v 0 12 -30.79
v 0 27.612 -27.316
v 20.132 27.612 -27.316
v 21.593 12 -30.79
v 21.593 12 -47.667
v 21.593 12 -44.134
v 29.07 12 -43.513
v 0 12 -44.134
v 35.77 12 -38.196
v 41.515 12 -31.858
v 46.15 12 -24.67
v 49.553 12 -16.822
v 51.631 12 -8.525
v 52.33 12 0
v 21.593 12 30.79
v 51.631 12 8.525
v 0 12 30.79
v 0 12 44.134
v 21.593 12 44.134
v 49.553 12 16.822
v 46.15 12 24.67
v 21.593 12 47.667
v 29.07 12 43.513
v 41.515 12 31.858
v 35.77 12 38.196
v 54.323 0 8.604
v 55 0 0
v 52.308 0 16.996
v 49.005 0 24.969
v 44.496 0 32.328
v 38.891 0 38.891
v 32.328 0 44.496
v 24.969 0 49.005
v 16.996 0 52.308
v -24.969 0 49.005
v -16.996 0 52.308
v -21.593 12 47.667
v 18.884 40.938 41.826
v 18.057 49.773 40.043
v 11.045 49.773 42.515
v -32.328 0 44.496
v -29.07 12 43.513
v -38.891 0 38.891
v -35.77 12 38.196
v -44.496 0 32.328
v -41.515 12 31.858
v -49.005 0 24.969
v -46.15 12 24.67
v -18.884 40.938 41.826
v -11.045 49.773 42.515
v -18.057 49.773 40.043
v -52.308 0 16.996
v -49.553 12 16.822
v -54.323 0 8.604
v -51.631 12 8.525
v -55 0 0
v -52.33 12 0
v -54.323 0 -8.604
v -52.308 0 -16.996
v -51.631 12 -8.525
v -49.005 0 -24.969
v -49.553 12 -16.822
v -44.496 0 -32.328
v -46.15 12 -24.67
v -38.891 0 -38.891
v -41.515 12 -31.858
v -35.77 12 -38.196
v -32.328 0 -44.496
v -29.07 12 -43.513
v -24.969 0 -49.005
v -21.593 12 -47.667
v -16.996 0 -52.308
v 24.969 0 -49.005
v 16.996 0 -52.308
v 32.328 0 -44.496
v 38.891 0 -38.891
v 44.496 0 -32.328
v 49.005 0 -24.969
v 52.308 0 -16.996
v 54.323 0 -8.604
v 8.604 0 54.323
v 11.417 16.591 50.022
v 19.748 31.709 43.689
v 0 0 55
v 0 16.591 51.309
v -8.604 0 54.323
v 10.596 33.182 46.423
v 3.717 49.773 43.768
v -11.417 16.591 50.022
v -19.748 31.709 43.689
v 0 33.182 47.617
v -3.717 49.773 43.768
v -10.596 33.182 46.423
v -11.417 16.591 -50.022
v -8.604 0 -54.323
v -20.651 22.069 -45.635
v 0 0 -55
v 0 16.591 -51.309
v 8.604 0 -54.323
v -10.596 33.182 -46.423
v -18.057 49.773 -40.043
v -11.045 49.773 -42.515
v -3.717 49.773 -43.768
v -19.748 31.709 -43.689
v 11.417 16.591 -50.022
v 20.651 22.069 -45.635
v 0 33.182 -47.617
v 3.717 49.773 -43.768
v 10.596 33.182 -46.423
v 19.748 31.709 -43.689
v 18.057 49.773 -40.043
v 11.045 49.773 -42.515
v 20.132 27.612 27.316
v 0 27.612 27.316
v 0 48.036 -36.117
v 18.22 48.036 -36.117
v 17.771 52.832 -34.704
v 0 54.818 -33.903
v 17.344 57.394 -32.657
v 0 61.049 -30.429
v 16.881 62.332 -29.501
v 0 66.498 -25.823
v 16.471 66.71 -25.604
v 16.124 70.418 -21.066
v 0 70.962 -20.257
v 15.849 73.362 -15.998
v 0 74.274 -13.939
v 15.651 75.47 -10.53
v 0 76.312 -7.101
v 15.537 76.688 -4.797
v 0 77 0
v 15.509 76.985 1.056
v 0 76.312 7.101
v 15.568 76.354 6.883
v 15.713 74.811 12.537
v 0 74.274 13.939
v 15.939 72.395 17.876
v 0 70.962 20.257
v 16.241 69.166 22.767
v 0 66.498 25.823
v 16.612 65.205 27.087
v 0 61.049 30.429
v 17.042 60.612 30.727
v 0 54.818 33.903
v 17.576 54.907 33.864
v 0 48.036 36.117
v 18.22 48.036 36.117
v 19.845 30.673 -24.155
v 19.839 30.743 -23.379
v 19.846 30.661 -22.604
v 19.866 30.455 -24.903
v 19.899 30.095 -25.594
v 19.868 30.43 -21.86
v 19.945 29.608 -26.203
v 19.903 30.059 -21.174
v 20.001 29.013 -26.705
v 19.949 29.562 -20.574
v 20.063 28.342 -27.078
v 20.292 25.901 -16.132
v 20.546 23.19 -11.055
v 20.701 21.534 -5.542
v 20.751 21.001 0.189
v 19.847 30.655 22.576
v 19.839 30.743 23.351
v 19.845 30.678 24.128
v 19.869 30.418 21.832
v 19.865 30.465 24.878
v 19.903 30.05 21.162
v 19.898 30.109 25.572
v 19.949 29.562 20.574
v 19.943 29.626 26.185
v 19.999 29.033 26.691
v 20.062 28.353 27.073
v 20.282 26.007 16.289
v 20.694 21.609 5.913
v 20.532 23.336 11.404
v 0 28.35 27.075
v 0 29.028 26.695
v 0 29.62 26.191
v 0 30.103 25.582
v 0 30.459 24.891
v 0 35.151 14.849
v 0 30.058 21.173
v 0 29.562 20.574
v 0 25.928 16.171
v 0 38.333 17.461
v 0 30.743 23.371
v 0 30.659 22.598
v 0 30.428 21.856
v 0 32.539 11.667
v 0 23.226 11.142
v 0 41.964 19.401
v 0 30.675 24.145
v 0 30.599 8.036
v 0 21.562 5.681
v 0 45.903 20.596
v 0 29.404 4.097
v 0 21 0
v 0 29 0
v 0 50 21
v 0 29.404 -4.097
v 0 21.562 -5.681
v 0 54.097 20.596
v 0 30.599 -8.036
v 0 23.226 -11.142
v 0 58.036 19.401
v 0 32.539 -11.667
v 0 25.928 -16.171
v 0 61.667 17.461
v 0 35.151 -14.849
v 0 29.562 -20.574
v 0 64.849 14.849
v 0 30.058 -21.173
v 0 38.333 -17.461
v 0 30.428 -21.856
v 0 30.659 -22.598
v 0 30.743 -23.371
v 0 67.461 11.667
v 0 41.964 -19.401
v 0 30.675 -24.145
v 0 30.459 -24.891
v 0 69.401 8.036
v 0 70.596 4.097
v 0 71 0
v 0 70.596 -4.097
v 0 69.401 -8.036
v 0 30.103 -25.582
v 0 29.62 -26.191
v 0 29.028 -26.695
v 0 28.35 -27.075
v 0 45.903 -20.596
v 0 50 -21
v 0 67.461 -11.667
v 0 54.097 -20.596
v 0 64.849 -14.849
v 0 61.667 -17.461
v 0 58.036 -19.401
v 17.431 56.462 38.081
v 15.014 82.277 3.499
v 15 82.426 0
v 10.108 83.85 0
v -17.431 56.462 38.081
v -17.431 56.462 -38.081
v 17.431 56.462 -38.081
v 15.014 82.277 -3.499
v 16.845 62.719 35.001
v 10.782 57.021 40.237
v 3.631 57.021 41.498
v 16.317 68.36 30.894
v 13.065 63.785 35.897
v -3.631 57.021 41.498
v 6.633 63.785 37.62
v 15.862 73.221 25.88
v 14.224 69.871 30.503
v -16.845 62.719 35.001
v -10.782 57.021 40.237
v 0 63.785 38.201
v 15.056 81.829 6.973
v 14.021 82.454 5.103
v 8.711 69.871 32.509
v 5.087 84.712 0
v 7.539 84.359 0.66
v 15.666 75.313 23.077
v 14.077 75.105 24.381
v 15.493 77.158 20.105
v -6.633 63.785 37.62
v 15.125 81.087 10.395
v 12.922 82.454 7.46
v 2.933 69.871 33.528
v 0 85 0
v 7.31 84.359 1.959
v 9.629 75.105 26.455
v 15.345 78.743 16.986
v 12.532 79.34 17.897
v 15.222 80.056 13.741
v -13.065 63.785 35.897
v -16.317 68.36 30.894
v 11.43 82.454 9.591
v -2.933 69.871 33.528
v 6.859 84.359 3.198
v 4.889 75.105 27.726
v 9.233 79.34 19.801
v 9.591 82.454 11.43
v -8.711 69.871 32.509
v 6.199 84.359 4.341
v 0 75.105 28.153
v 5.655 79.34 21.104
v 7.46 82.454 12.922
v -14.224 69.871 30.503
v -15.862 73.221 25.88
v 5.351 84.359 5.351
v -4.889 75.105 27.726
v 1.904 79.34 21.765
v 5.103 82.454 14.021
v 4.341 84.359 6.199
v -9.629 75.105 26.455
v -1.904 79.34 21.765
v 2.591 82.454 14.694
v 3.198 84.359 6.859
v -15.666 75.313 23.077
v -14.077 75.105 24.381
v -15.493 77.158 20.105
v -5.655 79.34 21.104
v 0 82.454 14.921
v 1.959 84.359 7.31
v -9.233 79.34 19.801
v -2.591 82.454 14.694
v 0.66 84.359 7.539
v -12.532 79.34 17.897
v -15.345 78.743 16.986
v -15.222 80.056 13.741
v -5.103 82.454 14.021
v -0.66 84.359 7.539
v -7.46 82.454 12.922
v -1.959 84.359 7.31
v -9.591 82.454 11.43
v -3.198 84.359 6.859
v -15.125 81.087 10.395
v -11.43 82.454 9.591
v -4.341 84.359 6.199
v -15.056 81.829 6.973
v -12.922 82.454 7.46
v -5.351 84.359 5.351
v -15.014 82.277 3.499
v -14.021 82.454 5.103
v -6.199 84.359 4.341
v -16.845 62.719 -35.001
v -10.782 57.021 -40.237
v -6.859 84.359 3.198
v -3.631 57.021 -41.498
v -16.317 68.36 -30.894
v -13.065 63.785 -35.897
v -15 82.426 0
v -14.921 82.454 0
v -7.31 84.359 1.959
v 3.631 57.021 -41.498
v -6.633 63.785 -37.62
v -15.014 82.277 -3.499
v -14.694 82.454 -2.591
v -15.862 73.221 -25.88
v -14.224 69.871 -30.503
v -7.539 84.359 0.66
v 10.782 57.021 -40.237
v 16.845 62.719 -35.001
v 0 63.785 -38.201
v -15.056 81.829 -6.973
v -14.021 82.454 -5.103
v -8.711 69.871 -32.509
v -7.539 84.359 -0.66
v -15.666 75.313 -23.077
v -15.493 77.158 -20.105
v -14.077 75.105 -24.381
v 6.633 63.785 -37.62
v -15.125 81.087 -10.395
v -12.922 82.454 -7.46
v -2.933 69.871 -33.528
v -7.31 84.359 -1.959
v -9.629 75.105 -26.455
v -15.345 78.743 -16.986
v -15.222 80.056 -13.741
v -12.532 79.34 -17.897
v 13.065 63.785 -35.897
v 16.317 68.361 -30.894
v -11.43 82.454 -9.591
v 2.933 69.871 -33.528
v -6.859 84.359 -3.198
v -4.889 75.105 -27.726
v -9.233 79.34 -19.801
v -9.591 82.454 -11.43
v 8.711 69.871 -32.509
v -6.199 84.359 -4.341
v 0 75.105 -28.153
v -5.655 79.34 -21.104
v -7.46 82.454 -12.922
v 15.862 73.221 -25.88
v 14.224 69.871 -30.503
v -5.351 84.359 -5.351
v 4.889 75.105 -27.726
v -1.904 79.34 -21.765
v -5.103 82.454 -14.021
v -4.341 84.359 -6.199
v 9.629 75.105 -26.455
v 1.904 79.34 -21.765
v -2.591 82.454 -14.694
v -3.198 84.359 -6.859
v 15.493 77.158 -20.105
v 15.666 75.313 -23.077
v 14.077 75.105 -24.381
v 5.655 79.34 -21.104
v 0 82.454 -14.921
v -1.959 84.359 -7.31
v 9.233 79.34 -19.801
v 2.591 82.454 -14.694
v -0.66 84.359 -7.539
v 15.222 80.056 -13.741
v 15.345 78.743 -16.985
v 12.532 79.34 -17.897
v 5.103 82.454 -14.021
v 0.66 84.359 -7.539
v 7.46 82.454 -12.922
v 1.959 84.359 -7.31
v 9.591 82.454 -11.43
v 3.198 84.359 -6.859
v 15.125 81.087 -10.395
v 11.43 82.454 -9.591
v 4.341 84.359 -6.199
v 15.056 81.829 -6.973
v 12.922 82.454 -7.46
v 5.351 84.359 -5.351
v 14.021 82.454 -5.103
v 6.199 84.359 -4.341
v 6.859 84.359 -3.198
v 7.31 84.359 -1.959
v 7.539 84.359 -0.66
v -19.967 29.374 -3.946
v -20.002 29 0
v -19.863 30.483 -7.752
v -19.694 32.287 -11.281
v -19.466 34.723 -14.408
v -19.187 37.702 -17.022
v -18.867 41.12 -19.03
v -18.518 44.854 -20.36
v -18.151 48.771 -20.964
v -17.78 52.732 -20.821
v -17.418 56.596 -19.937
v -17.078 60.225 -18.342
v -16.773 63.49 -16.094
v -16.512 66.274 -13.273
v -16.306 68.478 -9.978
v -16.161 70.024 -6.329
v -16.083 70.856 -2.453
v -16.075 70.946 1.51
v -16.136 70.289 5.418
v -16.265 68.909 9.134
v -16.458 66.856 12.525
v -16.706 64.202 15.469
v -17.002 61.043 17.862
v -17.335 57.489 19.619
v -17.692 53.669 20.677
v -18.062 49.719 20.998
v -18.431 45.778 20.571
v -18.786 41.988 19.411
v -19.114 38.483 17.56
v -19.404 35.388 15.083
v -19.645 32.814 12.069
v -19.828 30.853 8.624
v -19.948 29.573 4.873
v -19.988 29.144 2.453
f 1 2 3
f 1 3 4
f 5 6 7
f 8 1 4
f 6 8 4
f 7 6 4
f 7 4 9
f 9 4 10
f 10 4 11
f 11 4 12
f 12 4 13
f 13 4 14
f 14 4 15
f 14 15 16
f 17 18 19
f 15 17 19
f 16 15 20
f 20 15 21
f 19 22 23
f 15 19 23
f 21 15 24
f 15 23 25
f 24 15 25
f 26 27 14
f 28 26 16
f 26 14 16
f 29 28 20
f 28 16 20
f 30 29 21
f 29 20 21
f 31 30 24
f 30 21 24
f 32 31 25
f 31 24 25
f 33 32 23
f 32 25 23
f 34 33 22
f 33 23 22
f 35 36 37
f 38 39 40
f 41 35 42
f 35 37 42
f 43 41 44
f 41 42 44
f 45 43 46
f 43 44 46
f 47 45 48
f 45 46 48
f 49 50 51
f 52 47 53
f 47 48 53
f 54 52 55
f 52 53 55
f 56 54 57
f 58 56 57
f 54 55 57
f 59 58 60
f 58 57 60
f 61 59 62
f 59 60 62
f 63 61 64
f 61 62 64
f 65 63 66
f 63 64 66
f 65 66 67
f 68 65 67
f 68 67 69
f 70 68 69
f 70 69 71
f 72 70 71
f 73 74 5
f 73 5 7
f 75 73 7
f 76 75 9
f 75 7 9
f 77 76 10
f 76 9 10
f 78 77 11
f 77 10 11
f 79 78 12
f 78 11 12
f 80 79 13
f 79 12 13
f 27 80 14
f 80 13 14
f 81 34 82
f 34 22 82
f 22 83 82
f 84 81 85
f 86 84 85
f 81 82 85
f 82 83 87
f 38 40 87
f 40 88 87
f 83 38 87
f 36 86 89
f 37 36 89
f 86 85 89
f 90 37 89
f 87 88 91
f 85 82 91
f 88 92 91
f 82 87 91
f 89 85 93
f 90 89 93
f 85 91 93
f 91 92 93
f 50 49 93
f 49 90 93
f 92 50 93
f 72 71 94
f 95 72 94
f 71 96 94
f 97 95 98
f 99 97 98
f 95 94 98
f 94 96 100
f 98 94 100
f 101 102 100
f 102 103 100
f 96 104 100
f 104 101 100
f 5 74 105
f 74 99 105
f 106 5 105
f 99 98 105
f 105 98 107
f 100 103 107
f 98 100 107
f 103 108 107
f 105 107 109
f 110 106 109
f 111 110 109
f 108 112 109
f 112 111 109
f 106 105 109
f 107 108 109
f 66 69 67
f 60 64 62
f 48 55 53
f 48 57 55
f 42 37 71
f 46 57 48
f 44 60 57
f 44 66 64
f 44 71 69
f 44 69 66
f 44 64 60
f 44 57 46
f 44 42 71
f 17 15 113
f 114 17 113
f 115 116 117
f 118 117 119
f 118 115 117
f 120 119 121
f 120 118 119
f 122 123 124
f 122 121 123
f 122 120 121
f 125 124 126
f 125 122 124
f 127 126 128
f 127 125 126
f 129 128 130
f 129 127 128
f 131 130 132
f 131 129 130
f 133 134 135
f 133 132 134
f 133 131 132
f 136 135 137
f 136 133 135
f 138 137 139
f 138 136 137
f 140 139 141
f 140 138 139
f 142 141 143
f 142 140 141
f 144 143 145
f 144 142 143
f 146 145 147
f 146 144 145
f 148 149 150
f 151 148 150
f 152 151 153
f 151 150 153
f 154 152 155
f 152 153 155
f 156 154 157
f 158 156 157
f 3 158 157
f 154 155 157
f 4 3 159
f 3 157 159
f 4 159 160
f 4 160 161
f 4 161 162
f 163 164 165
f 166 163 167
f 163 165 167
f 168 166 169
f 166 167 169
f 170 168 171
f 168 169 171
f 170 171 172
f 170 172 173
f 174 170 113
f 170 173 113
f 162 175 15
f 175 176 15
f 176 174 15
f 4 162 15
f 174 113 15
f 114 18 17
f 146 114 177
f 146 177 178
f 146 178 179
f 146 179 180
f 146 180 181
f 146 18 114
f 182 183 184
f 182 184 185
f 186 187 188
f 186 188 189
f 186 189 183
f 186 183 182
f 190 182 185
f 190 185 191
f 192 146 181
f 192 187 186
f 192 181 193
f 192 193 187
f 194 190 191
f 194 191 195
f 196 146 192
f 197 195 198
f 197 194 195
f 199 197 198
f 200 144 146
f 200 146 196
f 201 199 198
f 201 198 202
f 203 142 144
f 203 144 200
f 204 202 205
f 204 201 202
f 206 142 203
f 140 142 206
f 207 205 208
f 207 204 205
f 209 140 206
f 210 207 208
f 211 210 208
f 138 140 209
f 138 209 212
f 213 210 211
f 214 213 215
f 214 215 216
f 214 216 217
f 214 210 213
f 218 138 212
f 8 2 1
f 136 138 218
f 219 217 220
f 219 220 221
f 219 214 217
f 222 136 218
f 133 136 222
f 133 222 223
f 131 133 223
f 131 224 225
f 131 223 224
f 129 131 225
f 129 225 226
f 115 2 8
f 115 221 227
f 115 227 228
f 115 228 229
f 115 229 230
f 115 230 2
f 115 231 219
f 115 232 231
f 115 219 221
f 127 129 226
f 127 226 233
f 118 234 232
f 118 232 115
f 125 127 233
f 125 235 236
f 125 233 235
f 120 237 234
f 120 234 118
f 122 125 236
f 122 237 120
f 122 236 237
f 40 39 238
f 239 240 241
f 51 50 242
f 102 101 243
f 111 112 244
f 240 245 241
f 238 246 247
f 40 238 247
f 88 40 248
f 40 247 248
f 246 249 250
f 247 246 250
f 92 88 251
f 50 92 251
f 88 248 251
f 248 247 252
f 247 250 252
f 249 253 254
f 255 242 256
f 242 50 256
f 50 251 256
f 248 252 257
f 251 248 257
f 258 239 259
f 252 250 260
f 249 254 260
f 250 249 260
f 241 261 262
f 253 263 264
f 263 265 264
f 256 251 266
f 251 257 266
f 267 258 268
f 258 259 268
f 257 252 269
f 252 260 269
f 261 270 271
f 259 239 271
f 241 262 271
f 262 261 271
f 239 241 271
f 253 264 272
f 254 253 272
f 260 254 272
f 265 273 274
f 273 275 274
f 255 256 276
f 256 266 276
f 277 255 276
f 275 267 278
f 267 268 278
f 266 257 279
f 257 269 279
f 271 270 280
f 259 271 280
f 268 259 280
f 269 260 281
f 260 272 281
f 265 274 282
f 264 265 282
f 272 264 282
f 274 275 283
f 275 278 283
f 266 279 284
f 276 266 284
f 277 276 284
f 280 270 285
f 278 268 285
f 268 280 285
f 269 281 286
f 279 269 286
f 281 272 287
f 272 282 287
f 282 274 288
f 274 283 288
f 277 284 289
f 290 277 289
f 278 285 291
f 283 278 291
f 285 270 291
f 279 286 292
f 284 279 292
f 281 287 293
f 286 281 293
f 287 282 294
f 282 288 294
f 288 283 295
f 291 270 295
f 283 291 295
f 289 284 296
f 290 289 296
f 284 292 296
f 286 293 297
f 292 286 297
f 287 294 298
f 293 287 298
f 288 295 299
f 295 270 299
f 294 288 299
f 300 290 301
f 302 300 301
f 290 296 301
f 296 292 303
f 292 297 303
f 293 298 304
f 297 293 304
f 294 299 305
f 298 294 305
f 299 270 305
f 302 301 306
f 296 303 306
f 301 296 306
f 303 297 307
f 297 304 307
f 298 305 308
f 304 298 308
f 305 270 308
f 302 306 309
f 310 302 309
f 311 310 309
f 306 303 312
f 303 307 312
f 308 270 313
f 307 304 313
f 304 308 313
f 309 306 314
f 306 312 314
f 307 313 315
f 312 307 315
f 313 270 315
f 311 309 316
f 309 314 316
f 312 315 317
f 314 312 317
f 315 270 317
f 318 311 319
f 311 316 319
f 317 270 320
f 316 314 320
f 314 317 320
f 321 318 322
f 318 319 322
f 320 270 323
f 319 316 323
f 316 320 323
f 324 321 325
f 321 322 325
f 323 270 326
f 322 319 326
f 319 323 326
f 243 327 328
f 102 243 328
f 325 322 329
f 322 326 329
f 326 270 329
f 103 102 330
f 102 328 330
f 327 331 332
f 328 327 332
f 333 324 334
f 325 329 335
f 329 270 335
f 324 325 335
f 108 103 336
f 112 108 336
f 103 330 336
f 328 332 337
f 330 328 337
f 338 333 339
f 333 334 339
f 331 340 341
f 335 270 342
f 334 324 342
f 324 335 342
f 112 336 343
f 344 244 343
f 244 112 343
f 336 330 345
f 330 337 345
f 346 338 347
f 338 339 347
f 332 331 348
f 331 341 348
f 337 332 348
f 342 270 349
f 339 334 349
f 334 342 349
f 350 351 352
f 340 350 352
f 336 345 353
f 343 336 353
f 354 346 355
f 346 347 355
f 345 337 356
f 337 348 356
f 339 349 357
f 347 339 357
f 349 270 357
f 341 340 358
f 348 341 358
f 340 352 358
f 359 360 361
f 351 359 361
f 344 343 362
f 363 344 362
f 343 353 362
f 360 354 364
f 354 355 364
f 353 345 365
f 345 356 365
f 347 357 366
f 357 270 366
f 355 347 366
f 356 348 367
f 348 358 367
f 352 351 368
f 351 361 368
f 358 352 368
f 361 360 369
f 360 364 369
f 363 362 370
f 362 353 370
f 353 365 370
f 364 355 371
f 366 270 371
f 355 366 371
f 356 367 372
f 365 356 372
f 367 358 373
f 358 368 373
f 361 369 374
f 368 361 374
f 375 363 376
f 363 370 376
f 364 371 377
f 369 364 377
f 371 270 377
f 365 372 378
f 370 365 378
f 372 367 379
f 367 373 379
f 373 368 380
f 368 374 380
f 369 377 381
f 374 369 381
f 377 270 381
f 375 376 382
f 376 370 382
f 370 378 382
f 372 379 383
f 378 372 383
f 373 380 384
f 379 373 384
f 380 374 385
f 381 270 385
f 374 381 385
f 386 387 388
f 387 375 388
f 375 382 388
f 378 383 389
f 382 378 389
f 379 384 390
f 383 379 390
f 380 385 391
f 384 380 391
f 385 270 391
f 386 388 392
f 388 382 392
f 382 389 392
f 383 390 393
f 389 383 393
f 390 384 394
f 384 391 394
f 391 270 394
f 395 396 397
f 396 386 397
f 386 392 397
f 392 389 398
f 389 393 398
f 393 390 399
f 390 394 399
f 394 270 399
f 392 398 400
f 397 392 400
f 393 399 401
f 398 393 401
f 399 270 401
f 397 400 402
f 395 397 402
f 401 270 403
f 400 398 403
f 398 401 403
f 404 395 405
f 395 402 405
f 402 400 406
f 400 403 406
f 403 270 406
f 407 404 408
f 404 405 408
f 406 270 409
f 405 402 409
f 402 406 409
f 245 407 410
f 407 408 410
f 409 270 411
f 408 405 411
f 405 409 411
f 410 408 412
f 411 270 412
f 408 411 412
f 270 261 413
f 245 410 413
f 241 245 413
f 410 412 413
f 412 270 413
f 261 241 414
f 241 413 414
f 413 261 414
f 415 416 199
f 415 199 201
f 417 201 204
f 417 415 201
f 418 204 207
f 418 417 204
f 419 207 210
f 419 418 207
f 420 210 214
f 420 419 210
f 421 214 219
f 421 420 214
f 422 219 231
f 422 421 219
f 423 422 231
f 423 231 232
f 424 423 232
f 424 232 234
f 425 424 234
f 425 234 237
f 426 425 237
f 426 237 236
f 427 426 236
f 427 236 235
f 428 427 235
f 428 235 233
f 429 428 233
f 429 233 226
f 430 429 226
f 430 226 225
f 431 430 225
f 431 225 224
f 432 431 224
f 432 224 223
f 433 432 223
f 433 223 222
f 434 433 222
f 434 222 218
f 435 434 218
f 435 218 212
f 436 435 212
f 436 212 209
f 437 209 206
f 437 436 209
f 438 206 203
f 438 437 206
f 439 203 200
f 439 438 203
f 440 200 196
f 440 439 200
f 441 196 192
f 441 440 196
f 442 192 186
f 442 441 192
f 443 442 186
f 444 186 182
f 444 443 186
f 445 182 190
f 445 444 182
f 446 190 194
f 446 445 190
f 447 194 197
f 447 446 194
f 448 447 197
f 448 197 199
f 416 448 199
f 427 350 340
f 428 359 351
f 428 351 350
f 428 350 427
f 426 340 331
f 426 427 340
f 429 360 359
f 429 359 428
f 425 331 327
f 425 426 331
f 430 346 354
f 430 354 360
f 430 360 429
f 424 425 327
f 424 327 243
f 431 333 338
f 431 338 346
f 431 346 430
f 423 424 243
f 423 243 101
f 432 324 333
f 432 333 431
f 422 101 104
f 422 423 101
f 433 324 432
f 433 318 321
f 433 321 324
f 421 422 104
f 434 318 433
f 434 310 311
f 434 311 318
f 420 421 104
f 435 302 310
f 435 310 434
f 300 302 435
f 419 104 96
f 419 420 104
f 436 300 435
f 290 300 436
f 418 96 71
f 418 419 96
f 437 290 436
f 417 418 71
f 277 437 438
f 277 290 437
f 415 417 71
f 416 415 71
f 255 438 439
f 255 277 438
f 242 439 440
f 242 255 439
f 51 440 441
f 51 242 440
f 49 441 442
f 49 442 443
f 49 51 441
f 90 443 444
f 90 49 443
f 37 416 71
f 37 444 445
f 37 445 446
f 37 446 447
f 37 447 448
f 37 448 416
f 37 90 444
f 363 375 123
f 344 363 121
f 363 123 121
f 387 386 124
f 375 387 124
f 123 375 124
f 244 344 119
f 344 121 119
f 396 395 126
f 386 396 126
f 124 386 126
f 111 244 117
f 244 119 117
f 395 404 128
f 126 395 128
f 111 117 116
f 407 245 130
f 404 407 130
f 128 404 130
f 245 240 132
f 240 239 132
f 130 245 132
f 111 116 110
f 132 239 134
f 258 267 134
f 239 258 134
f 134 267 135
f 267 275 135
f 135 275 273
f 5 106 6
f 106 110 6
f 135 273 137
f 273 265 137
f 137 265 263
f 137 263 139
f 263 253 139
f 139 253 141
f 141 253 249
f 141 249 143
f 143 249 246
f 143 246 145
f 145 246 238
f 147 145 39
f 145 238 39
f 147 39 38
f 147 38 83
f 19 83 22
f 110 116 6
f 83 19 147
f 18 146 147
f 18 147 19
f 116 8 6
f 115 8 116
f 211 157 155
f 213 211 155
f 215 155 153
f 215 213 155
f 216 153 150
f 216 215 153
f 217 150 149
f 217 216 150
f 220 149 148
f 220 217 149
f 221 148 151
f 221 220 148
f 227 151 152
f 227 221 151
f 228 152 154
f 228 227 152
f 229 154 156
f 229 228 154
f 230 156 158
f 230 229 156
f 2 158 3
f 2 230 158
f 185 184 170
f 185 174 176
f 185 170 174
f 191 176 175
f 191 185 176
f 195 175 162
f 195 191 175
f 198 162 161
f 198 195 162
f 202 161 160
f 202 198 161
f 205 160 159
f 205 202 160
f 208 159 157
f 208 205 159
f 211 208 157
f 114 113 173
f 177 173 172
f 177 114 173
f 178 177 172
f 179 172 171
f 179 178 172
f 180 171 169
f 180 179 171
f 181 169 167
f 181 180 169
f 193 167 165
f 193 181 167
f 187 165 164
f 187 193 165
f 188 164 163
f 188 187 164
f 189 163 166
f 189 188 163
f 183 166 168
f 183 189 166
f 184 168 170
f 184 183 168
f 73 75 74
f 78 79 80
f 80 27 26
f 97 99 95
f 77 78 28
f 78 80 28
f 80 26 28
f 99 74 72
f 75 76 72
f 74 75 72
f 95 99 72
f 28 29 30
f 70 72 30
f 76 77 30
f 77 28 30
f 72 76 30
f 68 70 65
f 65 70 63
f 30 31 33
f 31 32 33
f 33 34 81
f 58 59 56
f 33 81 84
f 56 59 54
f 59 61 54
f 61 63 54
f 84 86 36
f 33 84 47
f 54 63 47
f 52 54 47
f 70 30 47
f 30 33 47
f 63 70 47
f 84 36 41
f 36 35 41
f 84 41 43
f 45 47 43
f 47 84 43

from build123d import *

# Parameters (mm, degrees)
CUT_EXTRUDE1_DEPTH      = 116.21718621802913
CUT_EXTRUDE4_DEPTH      = 116.21718621802913
CUT_EXTRUDE4_DEPTH_BACK = 35.99999999999998
SKETCH7_R               = 21
CUT_EXTRUDE7_DEPTH      = 116.21718621802913


with BuildPart() as part:
    # Sketch2 → Revolve3 (revolve)
    with BuildSketch(Plane.XY):
        with BuildLine():
            Line((0, 0), (-55, 0))
            Line((-55, 0), (-43.92591378263139, 49.77313145111816))
            ThreePointArc((-43.92591378263139, 49.77313145111816), (-28.153233248595832, 75.10549042030546), (0, 85))
            Line((0, 85), (0, 0))
        make_face()
    revolve(axis=Axis((0, 85, 0), (0, -1, 0)))

    # Sketch6 → Cut-Extrude1 (cut, symmetric)
    with BuildSketch(Plane.XY):
        with BuildLine():
            Line((-321.9355859945814, 12.000000000000119), (-52.33010500376227, 12.000000000000004))
            Line((-52.33010500376227, 12.000000000000004), (-23.212875062029127, 11.999999999999991))
            Line((-23.212875062029127, 11.999999999999991), (-15, 82.42640687119287))
            ThreePointArc((-15, 82.42640687119287), (2.76e-15, 84.99999999999994), (15, 82.42640687119287))
            Line((15, 82.42640687119287), (21.593288148671103, 11.999999999999996))
            Line((21.593288148671103, 11.999999999999996), (52.330105003762284, 12.000000000000016))
            Line((52.330105003762284, 12.000000000000016), (321.9355859945814, 12.000000000000187))
            Line((321.9355859945814, 12.000000000000187), (321.93558599458134, 551.2109619816384))
            Line((321.93558599458134, 551.2109619816384), (-321.93558599458146, 551.2109619816383))
            Line((-321.93558599458146, 551.2109619816383), (-321.9355859945814, 12.000000000000119))
        make_face()
    cut_extrude1 = extrude(amount=CUT_EXTRUDE1_DEPTH, both=True, mode=Mode.SUBTRACT)

    # Sketch7 → Cut-Extrude4 (cut, two sides: drawn at the far end of the back side and taken through both)
    with BuildSketch(Plane(origin=(0, 0, 0), x_dir=(0, 0, -1), z_dir=(1, 0, 0)).offset(-CUT_EXTRUDE4_DEPTH_BACK)):
        with Locations((0, 50)):
            Circle(SKETCH7_R)
    extrude(amount=CUT_EXTRUDE4_DEPTH + CUT_EXTRUDE4_DEPTH_BACK, mode=Mode.SUBTRACT)

    # Sketch7<10> → Cut-Extrude7 (cut, through all)
    with BuildSketch(Plane(origin=(0, 0, 0), x_dir=(0, 0, -1), z_dir=(1, 0, 0))):
        with BuildLine():
            Line((30.789792632377843, 11.999999999999996), (44.134487223755, 11.999999999999996))
            Line((44.134487223754995, 11.999999999999993), (36.11686244349691, 48.03568585980827))
            ThreePointArc((36.11686244349691, 48.03568585980827), (1.155e-14, 77), (-36.116862443496906, 48.03568585980828))
            Line((-36.116862443496906, 48.035685859808275), (-44.134487223754995, 11.999999999999993))
            Line((-44.134487223755, 11.999999999999993), (-30.78979263237784, 11.999999999999993))
            Line((-30.789792632377836, 11.999999999999982), (-27.316320113753125, 27.61172640955241))
            ThreePointArc((-27.316320113753125, 27.61172640955241), (-24.523281700699563, 30.58547626553829), (-20.57400117822397, 29.562033478879588))
            ThreePointArc((-20.57400117822397, 29.562033478879588), (5.33e-15, 21), (20.57400117822397, 29.562033478879595))
            ThreePointArc((20.574001178223973, 29.562033478879595), (24.523281700699563, 30.585476265538293), (27.31632011375313, 27.611726409552414))
            Line((27.31632011375313, 27.611726409552414), (30.789792632377843, 11.99999999999999))
        make_face()
    extrude(amount=CUT_EXTRUDE7_DEPTH, mode=Mode.SUBTRACT)

    # Mirror1: Cut-Extrude1 across plane
    add(cut_extrude1.mirror(Plane(origin=(0, 0, 0), x_dir=(0, 0, 1), z_dir=(1, 0, 0))), mode=Mode.SUBTRACT)


solid = part.part
